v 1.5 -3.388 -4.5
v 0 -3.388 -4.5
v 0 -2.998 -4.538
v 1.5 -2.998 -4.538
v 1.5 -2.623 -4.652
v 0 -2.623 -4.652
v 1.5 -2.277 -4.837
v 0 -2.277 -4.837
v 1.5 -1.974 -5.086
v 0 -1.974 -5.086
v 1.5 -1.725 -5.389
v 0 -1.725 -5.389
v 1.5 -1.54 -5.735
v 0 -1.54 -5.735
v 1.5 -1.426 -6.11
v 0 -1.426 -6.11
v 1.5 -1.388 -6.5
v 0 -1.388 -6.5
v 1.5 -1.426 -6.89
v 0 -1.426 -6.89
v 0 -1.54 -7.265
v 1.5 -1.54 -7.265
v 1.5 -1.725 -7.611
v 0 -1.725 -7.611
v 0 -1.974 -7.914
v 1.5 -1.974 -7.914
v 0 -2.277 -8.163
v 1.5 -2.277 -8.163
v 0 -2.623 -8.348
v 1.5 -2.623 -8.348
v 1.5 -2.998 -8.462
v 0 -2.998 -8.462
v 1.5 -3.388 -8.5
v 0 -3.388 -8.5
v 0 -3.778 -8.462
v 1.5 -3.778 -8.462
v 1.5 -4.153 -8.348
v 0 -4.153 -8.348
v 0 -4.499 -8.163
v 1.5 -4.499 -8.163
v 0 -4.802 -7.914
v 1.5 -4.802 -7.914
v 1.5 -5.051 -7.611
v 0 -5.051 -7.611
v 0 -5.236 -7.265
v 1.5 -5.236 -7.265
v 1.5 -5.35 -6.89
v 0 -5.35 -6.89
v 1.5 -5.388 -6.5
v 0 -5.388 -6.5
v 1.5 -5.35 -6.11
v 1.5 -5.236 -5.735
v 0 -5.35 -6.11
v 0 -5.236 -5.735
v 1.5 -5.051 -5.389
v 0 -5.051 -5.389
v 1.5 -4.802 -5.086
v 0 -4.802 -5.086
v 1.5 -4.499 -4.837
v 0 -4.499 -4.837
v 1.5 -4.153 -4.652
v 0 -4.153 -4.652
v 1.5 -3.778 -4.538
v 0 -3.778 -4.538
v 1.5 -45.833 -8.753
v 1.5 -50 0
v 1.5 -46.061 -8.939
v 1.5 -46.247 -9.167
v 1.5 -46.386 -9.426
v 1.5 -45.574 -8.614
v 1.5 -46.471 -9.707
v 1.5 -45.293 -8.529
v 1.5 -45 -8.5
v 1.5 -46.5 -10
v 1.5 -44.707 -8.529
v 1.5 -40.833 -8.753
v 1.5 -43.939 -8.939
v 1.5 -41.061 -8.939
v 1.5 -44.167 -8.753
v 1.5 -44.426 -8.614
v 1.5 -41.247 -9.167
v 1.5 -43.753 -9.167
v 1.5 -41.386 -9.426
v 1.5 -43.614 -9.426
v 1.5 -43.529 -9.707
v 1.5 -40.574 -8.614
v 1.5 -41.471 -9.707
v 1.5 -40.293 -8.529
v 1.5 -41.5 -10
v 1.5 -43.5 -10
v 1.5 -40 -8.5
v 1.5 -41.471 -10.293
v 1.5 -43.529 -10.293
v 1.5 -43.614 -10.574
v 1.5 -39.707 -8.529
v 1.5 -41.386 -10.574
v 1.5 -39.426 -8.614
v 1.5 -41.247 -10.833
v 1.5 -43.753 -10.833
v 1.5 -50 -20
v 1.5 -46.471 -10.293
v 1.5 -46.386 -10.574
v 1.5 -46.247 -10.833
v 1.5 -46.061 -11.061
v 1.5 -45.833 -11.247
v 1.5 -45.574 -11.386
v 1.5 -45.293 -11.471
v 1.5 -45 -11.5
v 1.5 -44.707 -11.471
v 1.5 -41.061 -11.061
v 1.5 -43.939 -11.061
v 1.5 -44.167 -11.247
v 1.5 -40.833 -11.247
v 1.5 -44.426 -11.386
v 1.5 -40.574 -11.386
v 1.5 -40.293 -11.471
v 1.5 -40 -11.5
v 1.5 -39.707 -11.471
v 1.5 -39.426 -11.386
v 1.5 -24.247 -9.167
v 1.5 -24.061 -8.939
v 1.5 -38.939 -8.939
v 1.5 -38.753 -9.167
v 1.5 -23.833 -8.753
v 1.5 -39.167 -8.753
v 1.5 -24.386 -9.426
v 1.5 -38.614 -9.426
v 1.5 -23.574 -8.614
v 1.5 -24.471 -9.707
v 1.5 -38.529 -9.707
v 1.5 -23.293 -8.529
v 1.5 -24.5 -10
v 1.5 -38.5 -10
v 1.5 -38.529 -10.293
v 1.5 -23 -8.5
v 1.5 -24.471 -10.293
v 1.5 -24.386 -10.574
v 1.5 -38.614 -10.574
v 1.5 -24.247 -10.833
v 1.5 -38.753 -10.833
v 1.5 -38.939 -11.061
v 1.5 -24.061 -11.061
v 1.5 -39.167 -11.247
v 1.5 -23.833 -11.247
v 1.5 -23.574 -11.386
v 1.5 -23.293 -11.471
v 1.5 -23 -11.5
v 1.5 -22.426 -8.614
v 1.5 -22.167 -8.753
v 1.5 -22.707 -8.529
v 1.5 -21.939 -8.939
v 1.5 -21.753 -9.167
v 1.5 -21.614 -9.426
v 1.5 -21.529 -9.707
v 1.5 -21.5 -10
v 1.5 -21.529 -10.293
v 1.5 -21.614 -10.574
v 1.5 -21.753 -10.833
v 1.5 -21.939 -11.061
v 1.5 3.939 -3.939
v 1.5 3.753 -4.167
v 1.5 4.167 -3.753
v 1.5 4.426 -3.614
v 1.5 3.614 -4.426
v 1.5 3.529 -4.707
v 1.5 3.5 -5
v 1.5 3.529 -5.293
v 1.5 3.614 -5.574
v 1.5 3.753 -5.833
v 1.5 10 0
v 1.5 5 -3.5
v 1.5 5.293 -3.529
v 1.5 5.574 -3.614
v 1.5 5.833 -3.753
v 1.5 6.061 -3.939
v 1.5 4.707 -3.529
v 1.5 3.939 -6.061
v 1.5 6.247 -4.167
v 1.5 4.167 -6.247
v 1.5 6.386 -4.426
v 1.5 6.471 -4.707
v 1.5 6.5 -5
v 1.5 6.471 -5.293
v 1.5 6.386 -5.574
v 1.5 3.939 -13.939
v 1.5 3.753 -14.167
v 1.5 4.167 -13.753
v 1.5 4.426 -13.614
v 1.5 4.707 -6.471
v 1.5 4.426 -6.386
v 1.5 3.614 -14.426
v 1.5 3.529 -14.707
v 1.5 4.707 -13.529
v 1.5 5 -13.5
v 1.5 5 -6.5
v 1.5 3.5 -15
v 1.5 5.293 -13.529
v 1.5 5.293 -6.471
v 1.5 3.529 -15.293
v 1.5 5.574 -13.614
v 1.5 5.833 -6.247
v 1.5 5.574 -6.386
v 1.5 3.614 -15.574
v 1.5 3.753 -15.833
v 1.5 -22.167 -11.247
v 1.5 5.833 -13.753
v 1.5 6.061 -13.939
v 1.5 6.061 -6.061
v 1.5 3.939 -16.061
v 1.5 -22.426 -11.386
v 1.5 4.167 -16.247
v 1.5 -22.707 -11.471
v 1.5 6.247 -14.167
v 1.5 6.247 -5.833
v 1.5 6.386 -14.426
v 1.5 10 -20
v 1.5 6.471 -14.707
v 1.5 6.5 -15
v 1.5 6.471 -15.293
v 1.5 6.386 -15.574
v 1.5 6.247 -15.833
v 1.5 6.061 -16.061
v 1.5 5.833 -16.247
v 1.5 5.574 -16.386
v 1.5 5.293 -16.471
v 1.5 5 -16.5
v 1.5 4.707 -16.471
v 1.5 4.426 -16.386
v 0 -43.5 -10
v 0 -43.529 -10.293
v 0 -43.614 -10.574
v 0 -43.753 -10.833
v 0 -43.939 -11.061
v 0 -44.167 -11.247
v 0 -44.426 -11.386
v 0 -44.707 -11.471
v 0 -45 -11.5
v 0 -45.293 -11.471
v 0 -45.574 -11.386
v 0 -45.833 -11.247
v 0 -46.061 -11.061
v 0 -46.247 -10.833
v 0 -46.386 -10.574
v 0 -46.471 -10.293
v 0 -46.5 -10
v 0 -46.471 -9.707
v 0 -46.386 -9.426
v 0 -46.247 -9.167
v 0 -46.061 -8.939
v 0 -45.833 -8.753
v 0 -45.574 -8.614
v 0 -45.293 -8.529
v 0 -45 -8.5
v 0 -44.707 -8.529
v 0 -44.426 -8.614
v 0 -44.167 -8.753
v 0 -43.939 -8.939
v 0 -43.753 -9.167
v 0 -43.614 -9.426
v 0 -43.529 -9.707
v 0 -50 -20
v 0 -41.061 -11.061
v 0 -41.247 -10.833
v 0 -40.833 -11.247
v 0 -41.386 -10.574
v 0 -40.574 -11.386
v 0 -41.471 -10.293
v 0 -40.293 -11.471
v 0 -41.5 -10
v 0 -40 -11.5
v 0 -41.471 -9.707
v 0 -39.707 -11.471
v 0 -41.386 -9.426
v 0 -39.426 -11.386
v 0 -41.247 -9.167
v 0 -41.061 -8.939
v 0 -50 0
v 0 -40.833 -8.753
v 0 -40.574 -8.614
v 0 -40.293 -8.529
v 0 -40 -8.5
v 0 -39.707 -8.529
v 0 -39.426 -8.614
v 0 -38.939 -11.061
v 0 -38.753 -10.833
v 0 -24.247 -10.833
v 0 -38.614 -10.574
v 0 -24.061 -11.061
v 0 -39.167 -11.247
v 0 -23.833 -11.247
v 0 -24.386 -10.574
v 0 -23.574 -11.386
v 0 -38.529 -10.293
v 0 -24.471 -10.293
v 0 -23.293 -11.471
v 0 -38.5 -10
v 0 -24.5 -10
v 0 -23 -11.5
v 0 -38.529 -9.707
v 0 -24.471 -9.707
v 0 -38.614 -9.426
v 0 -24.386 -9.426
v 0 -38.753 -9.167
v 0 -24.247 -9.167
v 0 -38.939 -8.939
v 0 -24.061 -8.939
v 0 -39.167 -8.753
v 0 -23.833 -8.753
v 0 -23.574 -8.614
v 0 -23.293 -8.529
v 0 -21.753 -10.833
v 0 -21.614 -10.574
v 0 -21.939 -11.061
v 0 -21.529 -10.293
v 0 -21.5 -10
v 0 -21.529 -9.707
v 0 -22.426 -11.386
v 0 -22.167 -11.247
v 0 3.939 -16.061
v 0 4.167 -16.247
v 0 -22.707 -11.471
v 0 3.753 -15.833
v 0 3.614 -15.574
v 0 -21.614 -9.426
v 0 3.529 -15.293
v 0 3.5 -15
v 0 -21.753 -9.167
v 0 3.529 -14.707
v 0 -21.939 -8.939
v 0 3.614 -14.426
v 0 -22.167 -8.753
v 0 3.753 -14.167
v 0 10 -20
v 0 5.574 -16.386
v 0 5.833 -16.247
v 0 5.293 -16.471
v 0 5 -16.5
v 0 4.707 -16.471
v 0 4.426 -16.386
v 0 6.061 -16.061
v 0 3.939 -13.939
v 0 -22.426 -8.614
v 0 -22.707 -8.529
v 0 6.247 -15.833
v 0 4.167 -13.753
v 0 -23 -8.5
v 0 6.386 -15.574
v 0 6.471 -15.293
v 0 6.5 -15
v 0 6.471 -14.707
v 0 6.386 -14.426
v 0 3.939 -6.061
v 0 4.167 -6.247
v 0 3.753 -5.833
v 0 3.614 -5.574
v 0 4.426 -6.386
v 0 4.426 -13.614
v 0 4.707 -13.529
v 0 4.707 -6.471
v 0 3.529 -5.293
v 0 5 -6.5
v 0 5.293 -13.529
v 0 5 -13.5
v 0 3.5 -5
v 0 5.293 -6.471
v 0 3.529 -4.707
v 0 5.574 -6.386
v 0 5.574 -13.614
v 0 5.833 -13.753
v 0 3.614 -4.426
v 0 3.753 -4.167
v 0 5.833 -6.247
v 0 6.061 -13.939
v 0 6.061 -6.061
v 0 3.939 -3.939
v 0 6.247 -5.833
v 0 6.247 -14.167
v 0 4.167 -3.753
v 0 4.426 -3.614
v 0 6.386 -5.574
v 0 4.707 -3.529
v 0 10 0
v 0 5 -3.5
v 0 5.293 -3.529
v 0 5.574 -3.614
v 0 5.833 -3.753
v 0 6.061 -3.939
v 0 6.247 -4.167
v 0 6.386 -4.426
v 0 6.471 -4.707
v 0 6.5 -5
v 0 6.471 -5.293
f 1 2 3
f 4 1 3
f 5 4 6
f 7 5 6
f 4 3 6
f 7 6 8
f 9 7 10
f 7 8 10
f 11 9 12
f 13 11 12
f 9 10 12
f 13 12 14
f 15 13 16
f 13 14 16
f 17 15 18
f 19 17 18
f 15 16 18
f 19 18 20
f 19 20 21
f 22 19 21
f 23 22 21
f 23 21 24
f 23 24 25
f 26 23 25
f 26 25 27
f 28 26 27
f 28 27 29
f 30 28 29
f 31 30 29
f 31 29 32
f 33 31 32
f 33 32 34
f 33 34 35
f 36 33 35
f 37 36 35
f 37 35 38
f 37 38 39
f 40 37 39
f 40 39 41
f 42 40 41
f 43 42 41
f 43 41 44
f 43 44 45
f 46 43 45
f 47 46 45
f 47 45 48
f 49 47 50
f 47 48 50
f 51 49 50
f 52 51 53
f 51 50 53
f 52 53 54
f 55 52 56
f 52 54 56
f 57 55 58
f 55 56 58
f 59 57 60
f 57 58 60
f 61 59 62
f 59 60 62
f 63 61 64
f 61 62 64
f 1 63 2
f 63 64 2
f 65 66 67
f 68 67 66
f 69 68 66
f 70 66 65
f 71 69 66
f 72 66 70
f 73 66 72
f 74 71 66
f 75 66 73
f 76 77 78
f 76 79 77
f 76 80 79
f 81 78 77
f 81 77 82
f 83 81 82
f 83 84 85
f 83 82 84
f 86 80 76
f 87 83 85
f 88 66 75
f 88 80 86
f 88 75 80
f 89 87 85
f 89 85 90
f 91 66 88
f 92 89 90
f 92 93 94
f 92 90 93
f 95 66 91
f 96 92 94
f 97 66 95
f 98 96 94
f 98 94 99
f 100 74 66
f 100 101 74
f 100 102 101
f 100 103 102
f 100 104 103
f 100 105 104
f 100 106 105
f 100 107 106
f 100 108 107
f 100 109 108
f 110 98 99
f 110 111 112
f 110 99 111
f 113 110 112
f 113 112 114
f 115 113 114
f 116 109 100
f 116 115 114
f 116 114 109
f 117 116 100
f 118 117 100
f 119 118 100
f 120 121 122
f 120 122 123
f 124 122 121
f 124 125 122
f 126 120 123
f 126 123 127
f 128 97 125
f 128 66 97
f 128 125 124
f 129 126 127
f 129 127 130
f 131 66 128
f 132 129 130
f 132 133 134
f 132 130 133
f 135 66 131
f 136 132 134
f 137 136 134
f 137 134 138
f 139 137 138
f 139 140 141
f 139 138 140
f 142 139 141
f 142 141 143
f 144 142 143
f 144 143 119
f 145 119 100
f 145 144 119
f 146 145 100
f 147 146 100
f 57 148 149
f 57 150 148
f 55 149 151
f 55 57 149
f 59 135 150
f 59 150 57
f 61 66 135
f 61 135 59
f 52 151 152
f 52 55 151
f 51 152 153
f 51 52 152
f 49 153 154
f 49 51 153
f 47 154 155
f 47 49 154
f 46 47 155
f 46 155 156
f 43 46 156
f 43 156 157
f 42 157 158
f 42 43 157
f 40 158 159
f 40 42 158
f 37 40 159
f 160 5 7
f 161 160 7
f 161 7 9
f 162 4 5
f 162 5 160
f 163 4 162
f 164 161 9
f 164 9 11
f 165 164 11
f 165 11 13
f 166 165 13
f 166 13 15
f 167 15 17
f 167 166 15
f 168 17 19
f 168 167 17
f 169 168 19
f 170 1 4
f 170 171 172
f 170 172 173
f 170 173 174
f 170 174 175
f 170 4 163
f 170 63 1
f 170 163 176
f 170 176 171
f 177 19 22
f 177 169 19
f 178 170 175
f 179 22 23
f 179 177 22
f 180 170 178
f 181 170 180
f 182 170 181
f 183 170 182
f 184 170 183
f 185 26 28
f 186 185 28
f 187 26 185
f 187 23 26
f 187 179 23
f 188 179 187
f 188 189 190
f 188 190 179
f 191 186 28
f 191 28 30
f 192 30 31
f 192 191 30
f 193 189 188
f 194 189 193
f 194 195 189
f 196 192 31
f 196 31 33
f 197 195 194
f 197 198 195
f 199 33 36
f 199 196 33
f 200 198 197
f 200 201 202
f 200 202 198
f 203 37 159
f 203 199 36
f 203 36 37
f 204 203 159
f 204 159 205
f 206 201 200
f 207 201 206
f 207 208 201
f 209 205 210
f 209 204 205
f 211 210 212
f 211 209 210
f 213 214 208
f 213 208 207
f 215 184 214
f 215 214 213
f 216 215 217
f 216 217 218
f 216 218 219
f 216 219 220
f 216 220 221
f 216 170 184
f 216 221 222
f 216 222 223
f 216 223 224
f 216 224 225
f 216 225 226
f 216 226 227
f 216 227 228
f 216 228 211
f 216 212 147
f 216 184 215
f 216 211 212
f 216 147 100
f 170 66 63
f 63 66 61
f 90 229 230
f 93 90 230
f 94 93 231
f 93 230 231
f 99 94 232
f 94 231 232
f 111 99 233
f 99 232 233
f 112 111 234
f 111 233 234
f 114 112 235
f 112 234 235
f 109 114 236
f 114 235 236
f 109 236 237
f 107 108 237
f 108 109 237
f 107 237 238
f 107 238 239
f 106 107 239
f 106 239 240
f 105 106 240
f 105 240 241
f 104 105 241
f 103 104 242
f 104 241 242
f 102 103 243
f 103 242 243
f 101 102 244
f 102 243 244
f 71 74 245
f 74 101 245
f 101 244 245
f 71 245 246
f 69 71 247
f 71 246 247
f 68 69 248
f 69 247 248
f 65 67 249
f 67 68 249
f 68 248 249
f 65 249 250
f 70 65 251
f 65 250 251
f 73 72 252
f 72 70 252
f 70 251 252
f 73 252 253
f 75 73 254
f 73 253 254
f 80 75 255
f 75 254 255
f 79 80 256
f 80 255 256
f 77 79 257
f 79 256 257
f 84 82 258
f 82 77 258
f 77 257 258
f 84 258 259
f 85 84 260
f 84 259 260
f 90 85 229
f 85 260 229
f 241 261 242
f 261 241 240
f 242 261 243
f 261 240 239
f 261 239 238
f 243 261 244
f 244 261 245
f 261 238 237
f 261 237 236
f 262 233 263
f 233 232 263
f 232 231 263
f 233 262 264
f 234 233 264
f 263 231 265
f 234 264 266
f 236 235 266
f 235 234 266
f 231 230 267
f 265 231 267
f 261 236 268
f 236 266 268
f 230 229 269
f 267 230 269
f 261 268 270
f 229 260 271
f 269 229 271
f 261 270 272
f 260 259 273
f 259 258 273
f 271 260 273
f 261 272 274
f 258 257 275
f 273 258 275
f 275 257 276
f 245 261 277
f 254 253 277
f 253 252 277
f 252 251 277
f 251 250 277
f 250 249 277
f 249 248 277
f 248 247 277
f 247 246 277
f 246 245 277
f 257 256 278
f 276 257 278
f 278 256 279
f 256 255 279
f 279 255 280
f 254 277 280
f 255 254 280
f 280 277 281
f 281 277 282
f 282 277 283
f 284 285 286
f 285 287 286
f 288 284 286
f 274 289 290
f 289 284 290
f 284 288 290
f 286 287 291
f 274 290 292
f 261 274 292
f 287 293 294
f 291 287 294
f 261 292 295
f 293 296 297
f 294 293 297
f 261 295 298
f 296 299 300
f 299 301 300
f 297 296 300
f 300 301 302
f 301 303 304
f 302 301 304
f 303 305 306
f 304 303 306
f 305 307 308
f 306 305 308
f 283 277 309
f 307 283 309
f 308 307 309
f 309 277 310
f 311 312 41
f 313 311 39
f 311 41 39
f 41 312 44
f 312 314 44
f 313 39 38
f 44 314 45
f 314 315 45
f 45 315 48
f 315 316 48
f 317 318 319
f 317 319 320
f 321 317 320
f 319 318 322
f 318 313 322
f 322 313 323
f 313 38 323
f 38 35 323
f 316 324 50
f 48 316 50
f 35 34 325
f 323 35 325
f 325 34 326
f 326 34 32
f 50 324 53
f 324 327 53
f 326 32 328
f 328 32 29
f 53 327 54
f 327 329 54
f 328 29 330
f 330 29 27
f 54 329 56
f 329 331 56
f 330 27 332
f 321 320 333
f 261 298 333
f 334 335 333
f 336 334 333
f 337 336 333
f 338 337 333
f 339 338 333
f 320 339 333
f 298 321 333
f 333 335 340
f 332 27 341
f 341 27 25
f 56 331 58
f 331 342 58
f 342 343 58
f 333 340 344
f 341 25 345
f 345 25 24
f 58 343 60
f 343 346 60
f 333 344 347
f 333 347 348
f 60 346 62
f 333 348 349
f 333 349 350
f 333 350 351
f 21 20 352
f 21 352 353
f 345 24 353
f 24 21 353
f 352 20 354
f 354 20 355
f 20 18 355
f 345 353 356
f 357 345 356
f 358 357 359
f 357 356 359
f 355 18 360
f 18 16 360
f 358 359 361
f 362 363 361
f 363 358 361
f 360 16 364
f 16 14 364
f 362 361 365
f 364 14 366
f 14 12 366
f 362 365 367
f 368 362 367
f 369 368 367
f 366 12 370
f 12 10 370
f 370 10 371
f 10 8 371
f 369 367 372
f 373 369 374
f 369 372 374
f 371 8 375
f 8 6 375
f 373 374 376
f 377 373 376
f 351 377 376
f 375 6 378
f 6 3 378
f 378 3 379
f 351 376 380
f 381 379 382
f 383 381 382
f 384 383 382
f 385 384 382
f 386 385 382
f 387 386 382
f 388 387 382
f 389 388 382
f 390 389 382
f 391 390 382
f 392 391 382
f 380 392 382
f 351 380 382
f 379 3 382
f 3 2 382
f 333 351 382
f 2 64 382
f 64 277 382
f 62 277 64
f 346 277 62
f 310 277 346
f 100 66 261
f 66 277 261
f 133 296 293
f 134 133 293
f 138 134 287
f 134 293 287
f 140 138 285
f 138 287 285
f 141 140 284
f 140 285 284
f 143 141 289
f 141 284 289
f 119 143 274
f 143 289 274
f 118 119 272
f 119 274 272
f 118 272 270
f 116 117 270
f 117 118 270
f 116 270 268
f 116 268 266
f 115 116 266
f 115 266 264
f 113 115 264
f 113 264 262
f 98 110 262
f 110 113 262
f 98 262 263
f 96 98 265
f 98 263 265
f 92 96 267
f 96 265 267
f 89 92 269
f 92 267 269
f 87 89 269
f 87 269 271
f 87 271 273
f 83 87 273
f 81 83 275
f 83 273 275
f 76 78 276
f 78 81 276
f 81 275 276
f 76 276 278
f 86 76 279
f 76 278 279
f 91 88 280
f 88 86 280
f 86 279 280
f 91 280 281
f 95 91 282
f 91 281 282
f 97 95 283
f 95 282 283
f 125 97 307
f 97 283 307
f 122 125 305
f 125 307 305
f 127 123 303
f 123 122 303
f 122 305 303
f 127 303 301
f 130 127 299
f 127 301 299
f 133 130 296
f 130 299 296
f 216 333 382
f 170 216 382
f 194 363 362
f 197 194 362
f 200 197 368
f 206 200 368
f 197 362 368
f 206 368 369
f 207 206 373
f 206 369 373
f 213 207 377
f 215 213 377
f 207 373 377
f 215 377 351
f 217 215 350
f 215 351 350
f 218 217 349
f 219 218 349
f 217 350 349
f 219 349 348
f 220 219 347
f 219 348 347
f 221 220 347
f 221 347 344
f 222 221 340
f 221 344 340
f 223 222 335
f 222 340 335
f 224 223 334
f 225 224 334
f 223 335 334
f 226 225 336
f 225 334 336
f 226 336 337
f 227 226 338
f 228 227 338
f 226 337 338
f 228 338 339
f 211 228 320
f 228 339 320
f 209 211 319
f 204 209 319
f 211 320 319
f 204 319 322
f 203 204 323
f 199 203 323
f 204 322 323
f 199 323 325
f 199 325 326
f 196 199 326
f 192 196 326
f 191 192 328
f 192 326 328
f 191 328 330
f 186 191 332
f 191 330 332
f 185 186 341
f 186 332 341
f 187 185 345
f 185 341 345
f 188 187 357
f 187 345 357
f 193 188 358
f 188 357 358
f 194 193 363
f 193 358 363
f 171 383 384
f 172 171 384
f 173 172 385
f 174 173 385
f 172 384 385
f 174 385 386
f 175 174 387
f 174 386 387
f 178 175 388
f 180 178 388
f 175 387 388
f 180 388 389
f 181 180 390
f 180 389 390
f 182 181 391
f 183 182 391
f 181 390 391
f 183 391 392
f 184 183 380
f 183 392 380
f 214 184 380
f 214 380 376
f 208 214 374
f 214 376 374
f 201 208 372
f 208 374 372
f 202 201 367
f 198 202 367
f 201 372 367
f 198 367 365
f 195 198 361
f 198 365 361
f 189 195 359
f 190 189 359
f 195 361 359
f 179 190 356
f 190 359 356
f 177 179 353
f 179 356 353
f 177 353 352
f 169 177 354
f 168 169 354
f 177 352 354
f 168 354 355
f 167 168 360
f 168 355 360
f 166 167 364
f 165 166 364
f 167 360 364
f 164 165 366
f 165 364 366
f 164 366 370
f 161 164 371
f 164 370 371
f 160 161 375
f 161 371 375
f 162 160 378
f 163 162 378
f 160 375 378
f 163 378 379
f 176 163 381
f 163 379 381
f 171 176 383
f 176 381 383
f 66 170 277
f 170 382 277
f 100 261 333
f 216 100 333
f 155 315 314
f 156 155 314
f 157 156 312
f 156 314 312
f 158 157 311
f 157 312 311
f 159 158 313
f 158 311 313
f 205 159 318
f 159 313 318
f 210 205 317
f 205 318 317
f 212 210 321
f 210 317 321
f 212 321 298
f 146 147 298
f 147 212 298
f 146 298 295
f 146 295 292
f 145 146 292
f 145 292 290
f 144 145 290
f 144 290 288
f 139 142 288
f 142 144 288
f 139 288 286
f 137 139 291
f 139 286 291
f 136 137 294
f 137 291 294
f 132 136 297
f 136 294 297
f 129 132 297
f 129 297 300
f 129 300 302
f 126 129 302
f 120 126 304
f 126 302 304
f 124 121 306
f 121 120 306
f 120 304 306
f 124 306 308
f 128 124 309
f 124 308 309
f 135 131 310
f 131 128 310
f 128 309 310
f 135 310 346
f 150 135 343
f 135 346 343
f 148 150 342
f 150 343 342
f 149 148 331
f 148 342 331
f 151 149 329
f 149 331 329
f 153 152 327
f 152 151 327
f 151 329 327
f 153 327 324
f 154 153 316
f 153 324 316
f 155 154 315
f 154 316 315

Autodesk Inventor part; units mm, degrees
ref_plane "YZ Plane" through (0, 0, 0) normal (1, 0, 0) x (0, 1, 0)
ref_plane "XZ Plane" through (0, 0, 0) normal (0, 1, 0) x (-1, 0, 0)
ref_plane "XY Plane" through (0, 0, 0) normal (0, 0, 1) x (1, 0, 0)
sketch "Sketch1" plane through (0, 0, 0) normal (1, 0, 0) x (0, 1, 0)
  line L0 (0, 0) -> (-50, 0)
  line L1 (-50, 0) -> (-50, -20)
  line L2 (-50, -20) -> (0, -20)
  line L3 (0, -20) -> (0, 0)
  line L4 (0, 0) -> (0, -10)
  line L5 (0, -10) -> (-10, -10)
  line L6 (-10, -10) -> (-23, -10)
  line L7 (-23, -10) -> (-40, -10)
  line L8 (-40, -10) -> (-45, -10)
  circle A0 centre (-10, -10) radius 1.5
  circle A1 centre (-23, -10) radius 1.5
  circle A2 centre (-40, -10) radius 1.5
  circle A3 centre (-45, -10) radius 1.5
  dimension "d0" = 50
  dimension "d1" = 20
  dimension "d2" = 10
  dimension "d3" = 10
  dimension "d4" = 13
  dimension "d5" = 17
  dimension "d7" = 5
  dimension "d8" = 3
  dimension "d9" = 3
  dimension "d10" = 3
  dimension "d11" = 3
extrude "Extrusion1" add sketch "Sketch1" along normal blind 1.5
sketch "Sketch2" plane through (0, 0, 0) normal (-1, 0, 0) x (0, 0, 1)
  line L0 (-20, 0) -> (0, 0) projected
  line L1 (0, 0) -> (-20, 0)
  line L2 (-20, 0) -> (-20, 10)
  line L3 (-20, 10) -> (0, 10)
  line L4 (0, 10) -> (0, 0)
  circle A0 centre (-10, -10) radius 1.5 projected
  line L5 (-10, -10) -> (-10, 5)
  line L6 (-10, 5) -> (-5, 5)
  line L7 (-5, 5) -> (-15, 5)
  circle A1 centre (-5, 5) radius 1.5
  circle A2 centre (-15, 5) radius 1.5
  dimension "d14" = 10
  dimension "d15" = 20
  dimension "d16" = 15
  dimension "d17" = 5
  dimension "d18" = 10
  dimension "d19" = 3
  dimension "d20" = 3
extrude "Extrusion2" add sketch "Sketch2" against normal blind 1.5 contours L2 L3 L4 L0
sketch "Sketch3" plane through (1.5, 0, 0) normal (1, 0, 0) x (0, 0, -1)
  circle A0 centre (10, -10) radius 1.5 projected
  circle A1 centre (10, -10) radius 1.5
  point P0 (0, 0)
extrude "Extrusion3" add sketch "Sketch3" against normal blind 1.5
sketch "Sketch5" plane through (0, 0, 0) normal (-1, 0, 0) x (0, 0, 1)
  line L0 (0, 10) -> (0, -50) projected
  line L1 (0, 10) -> (0, -3.388)
  line L2 (0, -3.388) -> (-6.5, -3.388)
  circle A0 centre (-6.5, -3.388) radius 2
  point P0 (0, 0)
  dimension "d30" = 13.388
  dimension "d31" = 6.5
  dimension "d32" = 4
extrude "Extrusion5" cut sketch "Sketch5" against normal blind 1.5
properties part number "plateLocker"
